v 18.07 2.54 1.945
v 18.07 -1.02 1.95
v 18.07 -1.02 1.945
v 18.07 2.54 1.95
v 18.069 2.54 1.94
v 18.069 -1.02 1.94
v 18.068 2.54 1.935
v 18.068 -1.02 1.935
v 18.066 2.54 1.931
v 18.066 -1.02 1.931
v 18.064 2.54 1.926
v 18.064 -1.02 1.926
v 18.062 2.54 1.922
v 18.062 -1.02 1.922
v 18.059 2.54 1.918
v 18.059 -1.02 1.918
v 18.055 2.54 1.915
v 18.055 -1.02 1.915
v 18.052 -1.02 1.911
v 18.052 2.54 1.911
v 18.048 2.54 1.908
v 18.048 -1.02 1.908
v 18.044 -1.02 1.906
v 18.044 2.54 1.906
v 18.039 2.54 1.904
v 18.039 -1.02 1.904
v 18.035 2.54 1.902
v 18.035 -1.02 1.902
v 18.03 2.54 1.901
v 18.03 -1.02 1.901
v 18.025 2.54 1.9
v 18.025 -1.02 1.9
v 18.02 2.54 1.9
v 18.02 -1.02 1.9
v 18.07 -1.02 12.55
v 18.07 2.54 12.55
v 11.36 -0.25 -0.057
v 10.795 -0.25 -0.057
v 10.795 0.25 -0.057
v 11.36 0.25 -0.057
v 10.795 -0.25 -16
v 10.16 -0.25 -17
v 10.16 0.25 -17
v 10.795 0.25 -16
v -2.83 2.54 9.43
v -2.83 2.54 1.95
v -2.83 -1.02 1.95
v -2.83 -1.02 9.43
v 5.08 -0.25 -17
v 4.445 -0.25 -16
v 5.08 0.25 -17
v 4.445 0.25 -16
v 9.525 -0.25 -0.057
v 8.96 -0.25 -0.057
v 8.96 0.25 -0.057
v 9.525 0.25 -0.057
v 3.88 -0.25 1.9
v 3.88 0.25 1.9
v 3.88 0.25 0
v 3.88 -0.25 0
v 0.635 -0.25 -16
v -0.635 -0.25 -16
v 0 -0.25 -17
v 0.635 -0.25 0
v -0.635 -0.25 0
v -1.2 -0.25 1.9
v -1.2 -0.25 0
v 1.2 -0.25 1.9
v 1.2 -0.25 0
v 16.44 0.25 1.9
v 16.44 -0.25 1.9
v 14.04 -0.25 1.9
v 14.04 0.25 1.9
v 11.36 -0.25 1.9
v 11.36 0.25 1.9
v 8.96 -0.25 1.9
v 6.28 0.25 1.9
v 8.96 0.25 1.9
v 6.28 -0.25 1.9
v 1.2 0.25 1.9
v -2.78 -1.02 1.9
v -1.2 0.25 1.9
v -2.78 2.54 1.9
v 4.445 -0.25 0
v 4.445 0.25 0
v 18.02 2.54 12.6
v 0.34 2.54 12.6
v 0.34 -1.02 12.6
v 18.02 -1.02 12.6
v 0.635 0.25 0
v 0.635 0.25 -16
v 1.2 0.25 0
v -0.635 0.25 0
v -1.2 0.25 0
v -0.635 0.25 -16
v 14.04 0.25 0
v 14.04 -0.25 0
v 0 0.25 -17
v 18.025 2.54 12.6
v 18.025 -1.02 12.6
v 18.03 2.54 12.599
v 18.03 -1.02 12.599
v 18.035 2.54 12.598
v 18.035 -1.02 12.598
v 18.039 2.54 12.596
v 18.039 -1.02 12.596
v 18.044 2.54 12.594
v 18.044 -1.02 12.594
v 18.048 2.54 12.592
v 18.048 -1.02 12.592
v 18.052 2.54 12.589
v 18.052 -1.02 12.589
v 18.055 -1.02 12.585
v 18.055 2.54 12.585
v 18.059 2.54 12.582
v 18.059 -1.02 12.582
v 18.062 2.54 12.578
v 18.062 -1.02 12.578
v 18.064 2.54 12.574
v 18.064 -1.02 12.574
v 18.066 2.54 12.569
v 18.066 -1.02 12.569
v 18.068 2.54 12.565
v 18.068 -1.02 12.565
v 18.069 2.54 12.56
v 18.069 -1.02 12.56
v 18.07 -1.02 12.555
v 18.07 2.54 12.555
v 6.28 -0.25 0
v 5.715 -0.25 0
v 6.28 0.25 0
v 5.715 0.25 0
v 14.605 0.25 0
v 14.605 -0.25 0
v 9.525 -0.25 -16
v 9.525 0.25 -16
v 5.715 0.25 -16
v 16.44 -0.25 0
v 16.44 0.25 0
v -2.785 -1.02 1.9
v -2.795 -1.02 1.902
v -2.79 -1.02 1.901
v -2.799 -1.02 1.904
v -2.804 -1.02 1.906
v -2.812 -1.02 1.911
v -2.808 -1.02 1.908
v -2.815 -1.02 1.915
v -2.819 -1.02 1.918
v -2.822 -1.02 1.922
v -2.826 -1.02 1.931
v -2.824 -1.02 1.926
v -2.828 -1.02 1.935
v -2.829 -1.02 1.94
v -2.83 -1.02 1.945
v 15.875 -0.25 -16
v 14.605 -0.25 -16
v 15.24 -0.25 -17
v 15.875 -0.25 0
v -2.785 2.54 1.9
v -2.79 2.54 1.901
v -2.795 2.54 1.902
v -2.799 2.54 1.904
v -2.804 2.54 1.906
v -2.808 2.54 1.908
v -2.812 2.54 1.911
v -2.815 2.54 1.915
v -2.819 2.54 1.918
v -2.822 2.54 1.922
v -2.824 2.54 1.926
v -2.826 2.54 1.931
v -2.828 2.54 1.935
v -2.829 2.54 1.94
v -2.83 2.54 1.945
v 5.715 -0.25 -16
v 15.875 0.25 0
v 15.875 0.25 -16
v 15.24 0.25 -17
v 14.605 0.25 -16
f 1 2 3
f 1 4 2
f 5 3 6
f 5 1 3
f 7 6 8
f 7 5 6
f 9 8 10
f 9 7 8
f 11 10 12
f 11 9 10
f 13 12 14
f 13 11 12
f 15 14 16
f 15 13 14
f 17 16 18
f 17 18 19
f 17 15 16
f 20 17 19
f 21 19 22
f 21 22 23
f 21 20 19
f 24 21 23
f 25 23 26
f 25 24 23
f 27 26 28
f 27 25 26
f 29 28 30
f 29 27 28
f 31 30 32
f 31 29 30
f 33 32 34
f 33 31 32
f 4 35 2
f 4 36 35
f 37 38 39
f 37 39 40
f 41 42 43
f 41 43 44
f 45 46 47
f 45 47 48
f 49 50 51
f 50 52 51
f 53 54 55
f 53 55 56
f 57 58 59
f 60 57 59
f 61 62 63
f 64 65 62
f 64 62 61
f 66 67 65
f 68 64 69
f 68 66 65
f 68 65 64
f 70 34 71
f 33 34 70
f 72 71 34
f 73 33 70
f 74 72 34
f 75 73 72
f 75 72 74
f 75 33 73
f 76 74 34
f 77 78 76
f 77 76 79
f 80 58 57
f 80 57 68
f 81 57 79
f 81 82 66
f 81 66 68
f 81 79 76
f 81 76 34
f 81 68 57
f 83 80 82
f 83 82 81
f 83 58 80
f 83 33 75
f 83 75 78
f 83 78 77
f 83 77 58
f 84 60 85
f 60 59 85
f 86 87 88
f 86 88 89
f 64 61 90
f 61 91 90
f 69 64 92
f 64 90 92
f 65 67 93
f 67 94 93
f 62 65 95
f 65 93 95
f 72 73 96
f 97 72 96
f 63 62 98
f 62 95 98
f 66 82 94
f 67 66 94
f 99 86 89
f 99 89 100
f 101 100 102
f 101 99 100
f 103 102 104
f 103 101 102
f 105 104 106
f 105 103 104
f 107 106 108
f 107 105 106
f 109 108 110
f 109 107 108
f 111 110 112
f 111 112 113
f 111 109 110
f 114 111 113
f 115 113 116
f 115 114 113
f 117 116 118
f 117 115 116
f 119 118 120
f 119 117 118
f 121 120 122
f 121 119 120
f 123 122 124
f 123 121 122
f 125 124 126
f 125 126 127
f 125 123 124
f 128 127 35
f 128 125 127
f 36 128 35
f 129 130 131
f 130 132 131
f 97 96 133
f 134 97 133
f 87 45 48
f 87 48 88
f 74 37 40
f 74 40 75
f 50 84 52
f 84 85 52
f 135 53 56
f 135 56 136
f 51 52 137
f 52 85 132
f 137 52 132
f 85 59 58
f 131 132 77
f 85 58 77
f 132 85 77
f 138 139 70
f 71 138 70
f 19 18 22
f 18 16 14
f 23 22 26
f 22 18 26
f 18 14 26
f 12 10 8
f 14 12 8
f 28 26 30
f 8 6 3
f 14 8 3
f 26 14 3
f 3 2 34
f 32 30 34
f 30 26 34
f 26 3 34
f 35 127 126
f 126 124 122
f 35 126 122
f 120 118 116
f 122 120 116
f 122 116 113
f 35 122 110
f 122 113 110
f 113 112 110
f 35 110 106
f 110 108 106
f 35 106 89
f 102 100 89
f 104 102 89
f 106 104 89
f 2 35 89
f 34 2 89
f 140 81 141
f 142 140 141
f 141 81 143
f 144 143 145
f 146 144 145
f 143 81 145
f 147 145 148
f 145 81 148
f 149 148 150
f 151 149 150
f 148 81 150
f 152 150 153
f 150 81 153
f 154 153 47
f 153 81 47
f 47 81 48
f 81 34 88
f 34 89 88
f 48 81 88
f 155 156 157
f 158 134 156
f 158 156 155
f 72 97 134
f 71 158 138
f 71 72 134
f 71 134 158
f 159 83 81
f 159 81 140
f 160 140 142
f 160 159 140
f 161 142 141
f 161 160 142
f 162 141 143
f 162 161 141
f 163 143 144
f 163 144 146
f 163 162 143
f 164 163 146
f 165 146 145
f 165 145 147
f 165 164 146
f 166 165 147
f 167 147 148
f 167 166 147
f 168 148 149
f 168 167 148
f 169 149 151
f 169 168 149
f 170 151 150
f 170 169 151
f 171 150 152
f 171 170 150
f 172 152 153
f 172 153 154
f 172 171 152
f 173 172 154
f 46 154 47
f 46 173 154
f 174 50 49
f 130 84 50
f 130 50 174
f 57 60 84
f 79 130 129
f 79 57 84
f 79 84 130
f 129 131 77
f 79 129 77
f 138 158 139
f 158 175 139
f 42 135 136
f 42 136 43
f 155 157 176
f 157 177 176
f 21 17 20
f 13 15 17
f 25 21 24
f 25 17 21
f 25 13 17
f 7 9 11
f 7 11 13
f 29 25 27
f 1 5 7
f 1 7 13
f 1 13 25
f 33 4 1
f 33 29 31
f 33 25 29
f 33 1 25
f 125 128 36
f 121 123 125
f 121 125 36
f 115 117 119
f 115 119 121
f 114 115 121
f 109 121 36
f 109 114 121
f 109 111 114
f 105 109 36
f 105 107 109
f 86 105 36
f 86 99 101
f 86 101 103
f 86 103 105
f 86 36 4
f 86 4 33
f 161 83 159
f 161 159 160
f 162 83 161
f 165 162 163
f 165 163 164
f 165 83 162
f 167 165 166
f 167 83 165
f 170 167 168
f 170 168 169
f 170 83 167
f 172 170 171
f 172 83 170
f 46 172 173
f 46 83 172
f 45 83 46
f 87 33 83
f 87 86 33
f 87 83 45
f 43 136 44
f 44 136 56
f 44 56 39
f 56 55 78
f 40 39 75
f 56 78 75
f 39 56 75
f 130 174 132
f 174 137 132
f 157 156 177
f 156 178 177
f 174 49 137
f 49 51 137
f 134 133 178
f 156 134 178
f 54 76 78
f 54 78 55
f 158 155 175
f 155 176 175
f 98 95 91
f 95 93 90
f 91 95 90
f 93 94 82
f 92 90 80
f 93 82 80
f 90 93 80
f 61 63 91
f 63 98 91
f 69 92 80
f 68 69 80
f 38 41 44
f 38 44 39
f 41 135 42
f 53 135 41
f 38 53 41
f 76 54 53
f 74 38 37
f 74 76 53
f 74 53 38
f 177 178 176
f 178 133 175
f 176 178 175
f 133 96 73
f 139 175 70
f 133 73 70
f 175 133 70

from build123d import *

# Parameters (mm, degrees)
PAD_DEPTH         = 0.25
PAD001_DEPTH      = 2.54
PAD001_DEPTH_BACK = 1.02


with BuildPart() as pad:
    # Sketch → Pad (new body, symmetric)
    with BuildSketch(Plane.XZ):
        Polygon((-1.2, 2), (-1.2, 0), (-0.635, 0), (-0.635, -16), (0, -17), (0.635, -16), (0.635, 0), (1.2, 0), (1.2, 2), align=None)
        Polygon((14.605, 0), (14.605, -16), (15.24, -17), (15.875, -16), (15.875, 0), (16.44, 0), (16.44, 2), (14.04, 2), (14.04, 0), align=None)
        Polygon((3.88, 2), (3.88, 0), (4.445, 0), (4.445, -16), (5.08, -17), (5.715, -16), (5.715, 0), (6.28, 0), (6.28, 2), align=None)
        Polygon((8.96, 2), (8.96, -0.056881), (9.525, -0.056881), (9.525, -16), (10.16, -17), (10.795, -16), (10.795, -0.056881), (11.36, -0.056881), (11.36, 2), align=None)
    extrude(amount=PAD_DEPTH, both=True)


with BuildPart() as diode_bridge_vishay_gbl:
    # Sketch001 → Pad001 (new body, two sides)
    with BuildSketch(Plane(origin=(15.24, 0, 0), x_dir=(-1, 0, 0), z_dir=(0, 1, 0))) as pad001_sk:
        with BuildLine():
            Line((-2.78, 1.9), (18.02, 1.9))
            ThreePointArc((18.02, 1.9), (18.055355, 1.914645), (18.07, 1.95))
            Line((18.07, 1.95), (18.07, 9.43))
            Line((18.07, 9.43), (14.9, 12.6))
            Line((14.9, 12.6), (-2.78, 12.6))
            ThreePointArc((-2.78, 12.6), (-2.815355, 12.585355), (-2.83, 12.55))
            Line((-2.83, 12.55), (-2.83, 1.95))
            ThreePointArc((-2.83, 1.95), (-2.815355, 1.914645), (-2.78, 1.9))
        make_face()
    extrude(amount=PAD001_DEPTH)
    extrude(pad001_sk.sketch, amount=-PAD001_DEPTH_BACK)

    # Pad001_mp_cp: union Pad
    add(pad.part)


solid = diode_bridge_vishay_gbl.part
